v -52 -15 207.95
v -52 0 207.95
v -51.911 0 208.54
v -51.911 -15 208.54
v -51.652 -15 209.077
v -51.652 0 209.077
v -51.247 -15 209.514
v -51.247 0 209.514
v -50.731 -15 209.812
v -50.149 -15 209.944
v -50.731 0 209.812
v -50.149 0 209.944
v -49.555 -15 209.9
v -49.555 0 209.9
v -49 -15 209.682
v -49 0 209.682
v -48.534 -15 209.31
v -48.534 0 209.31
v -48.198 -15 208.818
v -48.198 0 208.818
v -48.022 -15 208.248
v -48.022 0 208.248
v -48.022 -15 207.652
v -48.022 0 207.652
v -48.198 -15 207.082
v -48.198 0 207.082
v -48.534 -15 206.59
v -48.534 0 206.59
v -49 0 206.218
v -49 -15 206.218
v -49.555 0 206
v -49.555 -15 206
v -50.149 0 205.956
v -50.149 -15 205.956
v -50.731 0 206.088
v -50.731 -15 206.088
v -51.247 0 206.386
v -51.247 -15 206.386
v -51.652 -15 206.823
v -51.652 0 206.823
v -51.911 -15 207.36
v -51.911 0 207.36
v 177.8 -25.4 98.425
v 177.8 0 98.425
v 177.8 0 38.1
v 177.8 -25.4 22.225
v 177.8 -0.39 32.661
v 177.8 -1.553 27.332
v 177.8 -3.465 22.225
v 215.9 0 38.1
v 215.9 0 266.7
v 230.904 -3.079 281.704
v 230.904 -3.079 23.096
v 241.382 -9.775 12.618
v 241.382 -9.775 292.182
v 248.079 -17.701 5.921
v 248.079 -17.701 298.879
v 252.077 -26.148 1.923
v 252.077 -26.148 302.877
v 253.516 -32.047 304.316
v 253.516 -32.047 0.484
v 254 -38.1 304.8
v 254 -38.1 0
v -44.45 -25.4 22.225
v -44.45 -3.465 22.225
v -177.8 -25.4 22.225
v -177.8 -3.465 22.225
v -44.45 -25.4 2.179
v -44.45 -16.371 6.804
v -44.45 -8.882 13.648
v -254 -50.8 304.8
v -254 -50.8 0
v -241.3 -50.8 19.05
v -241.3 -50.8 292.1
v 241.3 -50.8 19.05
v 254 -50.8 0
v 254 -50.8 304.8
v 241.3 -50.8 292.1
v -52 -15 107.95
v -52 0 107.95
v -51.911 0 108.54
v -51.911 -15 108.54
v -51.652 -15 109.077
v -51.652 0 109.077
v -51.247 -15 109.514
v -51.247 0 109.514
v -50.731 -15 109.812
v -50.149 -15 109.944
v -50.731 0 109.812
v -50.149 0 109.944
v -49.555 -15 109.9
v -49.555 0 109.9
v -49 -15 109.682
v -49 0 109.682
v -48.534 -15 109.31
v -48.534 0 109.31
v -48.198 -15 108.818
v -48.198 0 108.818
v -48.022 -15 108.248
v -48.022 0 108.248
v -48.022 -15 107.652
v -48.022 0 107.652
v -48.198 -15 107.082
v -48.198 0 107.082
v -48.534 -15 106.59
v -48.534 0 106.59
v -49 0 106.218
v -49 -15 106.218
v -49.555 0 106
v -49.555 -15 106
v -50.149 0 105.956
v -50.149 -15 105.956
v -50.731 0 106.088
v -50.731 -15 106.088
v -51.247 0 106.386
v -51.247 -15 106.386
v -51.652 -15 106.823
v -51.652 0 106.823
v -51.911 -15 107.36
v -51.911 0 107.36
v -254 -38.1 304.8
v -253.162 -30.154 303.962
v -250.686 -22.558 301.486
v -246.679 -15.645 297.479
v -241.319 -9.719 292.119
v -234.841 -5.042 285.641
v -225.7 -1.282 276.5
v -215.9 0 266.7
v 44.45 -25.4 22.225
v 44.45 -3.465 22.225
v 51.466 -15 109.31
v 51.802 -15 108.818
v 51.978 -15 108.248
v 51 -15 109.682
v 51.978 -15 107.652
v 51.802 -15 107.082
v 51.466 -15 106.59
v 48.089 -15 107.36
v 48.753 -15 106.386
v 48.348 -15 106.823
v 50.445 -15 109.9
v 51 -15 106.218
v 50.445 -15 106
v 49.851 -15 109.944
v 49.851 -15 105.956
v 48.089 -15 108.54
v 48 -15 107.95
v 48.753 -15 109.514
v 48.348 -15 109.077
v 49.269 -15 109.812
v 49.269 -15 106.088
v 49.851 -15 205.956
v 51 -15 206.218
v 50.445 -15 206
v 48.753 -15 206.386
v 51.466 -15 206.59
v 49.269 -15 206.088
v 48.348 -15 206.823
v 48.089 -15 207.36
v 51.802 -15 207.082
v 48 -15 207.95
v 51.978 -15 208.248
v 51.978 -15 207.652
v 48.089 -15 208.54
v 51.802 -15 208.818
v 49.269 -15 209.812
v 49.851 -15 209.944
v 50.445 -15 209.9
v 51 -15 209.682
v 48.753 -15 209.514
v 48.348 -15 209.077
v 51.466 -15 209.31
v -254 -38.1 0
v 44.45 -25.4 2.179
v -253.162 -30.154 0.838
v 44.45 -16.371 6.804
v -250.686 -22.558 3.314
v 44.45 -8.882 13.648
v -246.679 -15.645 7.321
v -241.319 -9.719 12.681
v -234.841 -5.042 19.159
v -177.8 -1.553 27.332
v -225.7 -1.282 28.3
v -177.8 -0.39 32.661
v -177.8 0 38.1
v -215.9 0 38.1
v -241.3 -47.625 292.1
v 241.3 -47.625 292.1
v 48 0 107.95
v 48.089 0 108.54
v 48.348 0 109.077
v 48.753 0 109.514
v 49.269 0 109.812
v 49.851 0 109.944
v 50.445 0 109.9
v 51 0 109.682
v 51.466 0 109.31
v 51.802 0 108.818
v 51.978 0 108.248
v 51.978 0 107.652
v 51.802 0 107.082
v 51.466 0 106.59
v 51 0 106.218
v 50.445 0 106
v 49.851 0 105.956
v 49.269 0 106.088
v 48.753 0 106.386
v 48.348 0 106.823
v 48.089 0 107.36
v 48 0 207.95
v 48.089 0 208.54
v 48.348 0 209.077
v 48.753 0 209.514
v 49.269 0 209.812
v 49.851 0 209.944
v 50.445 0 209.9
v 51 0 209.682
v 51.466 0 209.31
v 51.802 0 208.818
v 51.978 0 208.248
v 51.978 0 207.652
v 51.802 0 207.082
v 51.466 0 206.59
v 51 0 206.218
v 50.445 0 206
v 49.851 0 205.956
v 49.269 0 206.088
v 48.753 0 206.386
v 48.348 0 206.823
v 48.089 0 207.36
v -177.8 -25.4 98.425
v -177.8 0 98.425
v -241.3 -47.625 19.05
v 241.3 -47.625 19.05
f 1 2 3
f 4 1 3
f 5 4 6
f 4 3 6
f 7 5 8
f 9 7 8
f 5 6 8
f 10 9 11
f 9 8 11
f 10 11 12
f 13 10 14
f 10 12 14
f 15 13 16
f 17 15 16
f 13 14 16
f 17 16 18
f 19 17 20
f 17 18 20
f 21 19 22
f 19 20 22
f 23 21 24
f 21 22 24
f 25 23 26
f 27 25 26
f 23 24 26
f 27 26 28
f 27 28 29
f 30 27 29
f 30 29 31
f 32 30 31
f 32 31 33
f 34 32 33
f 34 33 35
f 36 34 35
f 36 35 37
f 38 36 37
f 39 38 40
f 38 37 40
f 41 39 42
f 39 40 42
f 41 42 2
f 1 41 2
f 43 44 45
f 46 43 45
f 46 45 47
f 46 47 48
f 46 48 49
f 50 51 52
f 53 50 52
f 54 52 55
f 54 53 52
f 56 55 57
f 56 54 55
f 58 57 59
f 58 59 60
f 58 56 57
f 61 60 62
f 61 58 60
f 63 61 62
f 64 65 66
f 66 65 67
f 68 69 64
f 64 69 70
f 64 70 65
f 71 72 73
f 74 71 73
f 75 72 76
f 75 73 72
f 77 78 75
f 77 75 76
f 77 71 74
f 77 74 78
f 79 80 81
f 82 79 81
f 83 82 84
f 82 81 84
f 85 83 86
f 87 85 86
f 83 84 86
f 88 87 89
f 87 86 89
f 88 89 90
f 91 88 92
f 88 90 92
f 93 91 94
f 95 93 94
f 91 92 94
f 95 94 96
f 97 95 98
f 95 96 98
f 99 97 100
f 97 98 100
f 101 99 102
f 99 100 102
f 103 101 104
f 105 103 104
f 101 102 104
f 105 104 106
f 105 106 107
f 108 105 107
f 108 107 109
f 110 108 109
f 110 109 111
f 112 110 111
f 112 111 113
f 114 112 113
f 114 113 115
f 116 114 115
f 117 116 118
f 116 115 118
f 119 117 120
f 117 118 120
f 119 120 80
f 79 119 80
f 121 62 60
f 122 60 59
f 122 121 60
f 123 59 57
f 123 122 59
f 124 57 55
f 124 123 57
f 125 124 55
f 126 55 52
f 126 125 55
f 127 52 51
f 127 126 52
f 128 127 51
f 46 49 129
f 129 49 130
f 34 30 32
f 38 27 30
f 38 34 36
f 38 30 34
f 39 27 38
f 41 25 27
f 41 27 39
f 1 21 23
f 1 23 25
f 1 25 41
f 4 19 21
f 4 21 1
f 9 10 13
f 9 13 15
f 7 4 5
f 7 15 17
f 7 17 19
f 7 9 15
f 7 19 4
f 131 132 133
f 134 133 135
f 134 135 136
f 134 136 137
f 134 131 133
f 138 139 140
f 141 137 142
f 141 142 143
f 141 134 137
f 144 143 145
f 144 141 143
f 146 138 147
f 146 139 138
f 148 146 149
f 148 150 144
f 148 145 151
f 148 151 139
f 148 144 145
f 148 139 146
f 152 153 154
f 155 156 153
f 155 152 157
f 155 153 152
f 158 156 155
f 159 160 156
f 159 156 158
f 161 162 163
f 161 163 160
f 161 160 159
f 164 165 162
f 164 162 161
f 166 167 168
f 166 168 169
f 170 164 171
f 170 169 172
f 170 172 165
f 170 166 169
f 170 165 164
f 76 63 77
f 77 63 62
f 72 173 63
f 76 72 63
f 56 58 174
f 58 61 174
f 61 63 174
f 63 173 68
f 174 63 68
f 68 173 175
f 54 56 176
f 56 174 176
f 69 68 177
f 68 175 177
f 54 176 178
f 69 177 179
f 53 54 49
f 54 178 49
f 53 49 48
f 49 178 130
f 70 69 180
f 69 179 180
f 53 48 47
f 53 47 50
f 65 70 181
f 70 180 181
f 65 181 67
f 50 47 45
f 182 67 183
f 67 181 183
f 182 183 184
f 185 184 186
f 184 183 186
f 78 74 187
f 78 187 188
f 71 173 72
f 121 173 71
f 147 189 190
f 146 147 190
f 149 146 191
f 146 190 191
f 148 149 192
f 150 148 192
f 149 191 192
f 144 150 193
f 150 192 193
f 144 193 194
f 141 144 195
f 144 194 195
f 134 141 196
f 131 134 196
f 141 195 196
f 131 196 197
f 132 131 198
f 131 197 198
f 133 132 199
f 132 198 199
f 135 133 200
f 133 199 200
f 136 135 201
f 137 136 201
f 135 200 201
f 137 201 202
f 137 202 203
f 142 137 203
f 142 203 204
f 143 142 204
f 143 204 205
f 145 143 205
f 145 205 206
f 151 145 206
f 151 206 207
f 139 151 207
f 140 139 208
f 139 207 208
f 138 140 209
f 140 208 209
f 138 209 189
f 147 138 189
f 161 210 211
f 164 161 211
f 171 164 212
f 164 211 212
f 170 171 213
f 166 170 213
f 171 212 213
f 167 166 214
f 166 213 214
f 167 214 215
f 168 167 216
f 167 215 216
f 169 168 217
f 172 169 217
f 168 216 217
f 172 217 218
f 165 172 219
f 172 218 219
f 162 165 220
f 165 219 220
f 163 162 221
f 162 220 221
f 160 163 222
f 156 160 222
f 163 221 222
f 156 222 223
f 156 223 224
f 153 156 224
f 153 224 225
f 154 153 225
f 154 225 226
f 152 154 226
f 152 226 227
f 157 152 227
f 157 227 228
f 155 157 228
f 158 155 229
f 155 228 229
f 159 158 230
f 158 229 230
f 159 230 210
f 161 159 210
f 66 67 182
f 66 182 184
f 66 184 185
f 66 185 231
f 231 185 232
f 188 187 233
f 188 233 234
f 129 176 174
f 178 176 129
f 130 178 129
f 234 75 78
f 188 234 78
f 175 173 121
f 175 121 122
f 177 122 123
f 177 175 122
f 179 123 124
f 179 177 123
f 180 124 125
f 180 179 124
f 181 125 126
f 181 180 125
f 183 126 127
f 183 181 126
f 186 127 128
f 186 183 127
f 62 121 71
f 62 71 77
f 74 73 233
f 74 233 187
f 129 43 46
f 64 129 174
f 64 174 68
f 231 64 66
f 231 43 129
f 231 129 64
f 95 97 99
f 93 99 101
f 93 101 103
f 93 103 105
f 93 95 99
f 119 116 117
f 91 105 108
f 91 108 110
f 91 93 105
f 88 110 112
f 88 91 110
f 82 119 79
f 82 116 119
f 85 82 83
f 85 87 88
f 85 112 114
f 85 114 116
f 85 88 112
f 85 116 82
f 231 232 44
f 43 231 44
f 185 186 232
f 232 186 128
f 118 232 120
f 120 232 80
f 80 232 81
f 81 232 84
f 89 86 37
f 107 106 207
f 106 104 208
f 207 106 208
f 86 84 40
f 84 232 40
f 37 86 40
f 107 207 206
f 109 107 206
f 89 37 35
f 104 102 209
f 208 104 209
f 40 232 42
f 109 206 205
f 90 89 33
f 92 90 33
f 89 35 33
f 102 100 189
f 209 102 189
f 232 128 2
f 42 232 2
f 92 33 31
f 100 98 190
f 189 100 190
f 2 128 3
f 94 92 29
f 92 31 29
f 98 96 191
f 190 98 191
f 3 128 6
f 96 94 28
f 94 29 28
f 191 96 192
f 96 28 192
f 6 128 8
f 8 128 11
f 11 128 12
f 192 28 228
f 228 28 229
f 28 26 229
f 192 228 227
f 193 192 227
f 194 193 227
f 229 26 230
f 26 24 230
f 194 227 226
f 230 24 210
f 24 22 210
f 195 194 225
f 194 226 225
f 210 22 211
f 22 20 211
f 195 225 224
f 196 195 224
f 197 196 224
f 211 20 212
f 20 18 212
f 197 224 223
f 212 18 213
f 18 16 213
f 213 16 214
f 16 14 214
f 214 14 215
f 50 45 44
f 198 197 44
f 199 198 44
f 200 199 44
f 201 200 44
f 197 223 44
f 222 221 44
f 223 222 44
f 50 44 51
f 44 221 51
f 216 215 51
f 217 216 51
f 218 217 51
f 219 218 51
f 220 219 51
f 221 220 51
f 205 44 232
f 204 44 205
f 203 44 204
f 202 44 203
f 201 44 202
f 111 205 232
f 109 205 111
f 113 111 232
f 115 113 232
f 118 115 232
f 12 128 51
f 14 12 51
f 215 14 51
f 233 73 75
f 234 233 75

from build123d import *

# Parameters (mm, degrees)
F0_W        = 508
F0_H        = 304.8
F1_DEPTH    = 50.8
F2_W        = 482.6
F2_H        = 273.05
F3_DEPTH    = 3.175
F4_R        = 2
F5_DEPTH    = 15
F6_W        = 88.9
F6_H        = 22.225
F7_DEPTH    = 25.4
F8_T1_DEPTH = 400.05
F8_T3_DEPTH = 495.3
F8_T5_DEPTH = 698.5
F8_T7_DEPTH = 400.05


# Not quite as in the source:
# - a fillet or chamfer that OpenCascade refuses, or shapes differently, is made with other operations: its cross-section is extruded or revolved along the edge and cut away or added


with BuildPart() as f1:
    # F0 (on Front) → F1 (new body)
    with BuildSketch(Plane.XZ):
        with Locations((0, 152.4)):
            Rectangle(F0_W, F0_H)
    extrude(amount=F1_DEPTH)

    # F2 (on face) → F3 (cut)
    with BuildSketch(Plane.XZ.offset(50.8)):
        with Locations((0, 155.575)):
            Rectangle(F2_W, F2_H)
    extrude(amount=-F3_DEPTH, mode=Mode.SUBTRACT)

    # F4 (on face) → F5 (cut)
    with BuildSketch(Plane(origin=(0, 0, 0), x_dir=(-1, 0, 0), z_dir=(0, 1, 0))):
        with Locations((-50, 207.95)):
            Circle(F4_R)
        with Locations((50, 207.95)):
            Circle(F4_R)
        with Locations((-50, 107.95)):
            Circle(F4_R)
        with Locations((50, 107.95)):
            Circle(F4_R)
    extrude(amount=-F5_DEPTH, mode=Mode.SUBTRACT)

    # F6 (on face) → F7 (cut)
    with BuildSketch(Plane(origin=(0, 0, 0), x_dir=(-1, 0, 0), z_dir=(0, 1, 0))):
        Polygon((177.8, 98.425), (-177.8, 98.425), (-177.8, 22.225), (-44.45, 22.225), (44.45, 22.225), (177.8, 22.225), align=None)
        with Locations((0, 11.1125)):
            Rectangle(F6_W, F6_H)
    extrude(amount=-F7_DEPTH, mode=Mode.SUBTRACT)

    # F8: fillet of radius 38.1 on 5 edges, made by hand

    # F8_s2 → F8_t1 (cut)
    with BuildSketch(Plane.YZ.offset(-50.8)):
        with BuildLine():
            ThreePointArc((-38.1, 0), (-11.1592316368, 11.1592316368), (0, 38.1))
            Line((0, 38.1), (0, 0))
            Line((0, 0), (-38.1, 0))
        make_face()
    extrude(amount=F8_T1_DEPTH, mode=Mode.SUBTRACT)

    # F8_s4 → F8_t3 (cut)
    with BuildSketch(Plane.XY.offset(-95.25)):
        with BuildLine():
            ThreePointArc((215.9, 0), (242.8407683632, -11.1592316368), (254, -38.1))
            Line((254, -38.1), (254, 0))
            Line((254, 0), (215.9, 0))
        make_face()
        with BuildLine():
            ThreePointArc((-254, -38.1), (-242.8407683632, -11.1592316368), (-215.9, 0))
            Line((-215.9, 0), (-254, 0))
            Line((-254, 0), (-254, -38.1))
        make_face()
    extrude(amount=F8_T3_DEPTH, mode=Mode.SUBTRACT)

    # F8_s6 → F8_t5 (cut)
    with BuildSketch(Plane.YZ.offset(-349.25)):
        with BuildLine():
            ThreePointArc((-38.1, 304.8), (-11.1592316368, 293.6407683632), (0, 266.7))
            Line((0, 266.7), (0, 304.8))
            Line((0, 304.8), (-38.1, 304.8))
        make_face()
    extrude(amount=F8_T5_DEPTH, mode=Mode.SUBTRACT)

    # F8_s8 → F8_t7 (cut)
    with BuildSketch(Plane.YZ.offset(-349.25)):
        with BuildLine():
            ThreePointArc((-38.1, 0), (-11.1592316368, 11.1592316368), (0, 38.1))
            Line((0, 38.1), (0, 0))
            Line((0, 0), (-38.1, 0))
        make_face()
    extrude(amount=F8_T7_DEPTH, mode=Mode.SUBTRACT)


solid = f1.part
